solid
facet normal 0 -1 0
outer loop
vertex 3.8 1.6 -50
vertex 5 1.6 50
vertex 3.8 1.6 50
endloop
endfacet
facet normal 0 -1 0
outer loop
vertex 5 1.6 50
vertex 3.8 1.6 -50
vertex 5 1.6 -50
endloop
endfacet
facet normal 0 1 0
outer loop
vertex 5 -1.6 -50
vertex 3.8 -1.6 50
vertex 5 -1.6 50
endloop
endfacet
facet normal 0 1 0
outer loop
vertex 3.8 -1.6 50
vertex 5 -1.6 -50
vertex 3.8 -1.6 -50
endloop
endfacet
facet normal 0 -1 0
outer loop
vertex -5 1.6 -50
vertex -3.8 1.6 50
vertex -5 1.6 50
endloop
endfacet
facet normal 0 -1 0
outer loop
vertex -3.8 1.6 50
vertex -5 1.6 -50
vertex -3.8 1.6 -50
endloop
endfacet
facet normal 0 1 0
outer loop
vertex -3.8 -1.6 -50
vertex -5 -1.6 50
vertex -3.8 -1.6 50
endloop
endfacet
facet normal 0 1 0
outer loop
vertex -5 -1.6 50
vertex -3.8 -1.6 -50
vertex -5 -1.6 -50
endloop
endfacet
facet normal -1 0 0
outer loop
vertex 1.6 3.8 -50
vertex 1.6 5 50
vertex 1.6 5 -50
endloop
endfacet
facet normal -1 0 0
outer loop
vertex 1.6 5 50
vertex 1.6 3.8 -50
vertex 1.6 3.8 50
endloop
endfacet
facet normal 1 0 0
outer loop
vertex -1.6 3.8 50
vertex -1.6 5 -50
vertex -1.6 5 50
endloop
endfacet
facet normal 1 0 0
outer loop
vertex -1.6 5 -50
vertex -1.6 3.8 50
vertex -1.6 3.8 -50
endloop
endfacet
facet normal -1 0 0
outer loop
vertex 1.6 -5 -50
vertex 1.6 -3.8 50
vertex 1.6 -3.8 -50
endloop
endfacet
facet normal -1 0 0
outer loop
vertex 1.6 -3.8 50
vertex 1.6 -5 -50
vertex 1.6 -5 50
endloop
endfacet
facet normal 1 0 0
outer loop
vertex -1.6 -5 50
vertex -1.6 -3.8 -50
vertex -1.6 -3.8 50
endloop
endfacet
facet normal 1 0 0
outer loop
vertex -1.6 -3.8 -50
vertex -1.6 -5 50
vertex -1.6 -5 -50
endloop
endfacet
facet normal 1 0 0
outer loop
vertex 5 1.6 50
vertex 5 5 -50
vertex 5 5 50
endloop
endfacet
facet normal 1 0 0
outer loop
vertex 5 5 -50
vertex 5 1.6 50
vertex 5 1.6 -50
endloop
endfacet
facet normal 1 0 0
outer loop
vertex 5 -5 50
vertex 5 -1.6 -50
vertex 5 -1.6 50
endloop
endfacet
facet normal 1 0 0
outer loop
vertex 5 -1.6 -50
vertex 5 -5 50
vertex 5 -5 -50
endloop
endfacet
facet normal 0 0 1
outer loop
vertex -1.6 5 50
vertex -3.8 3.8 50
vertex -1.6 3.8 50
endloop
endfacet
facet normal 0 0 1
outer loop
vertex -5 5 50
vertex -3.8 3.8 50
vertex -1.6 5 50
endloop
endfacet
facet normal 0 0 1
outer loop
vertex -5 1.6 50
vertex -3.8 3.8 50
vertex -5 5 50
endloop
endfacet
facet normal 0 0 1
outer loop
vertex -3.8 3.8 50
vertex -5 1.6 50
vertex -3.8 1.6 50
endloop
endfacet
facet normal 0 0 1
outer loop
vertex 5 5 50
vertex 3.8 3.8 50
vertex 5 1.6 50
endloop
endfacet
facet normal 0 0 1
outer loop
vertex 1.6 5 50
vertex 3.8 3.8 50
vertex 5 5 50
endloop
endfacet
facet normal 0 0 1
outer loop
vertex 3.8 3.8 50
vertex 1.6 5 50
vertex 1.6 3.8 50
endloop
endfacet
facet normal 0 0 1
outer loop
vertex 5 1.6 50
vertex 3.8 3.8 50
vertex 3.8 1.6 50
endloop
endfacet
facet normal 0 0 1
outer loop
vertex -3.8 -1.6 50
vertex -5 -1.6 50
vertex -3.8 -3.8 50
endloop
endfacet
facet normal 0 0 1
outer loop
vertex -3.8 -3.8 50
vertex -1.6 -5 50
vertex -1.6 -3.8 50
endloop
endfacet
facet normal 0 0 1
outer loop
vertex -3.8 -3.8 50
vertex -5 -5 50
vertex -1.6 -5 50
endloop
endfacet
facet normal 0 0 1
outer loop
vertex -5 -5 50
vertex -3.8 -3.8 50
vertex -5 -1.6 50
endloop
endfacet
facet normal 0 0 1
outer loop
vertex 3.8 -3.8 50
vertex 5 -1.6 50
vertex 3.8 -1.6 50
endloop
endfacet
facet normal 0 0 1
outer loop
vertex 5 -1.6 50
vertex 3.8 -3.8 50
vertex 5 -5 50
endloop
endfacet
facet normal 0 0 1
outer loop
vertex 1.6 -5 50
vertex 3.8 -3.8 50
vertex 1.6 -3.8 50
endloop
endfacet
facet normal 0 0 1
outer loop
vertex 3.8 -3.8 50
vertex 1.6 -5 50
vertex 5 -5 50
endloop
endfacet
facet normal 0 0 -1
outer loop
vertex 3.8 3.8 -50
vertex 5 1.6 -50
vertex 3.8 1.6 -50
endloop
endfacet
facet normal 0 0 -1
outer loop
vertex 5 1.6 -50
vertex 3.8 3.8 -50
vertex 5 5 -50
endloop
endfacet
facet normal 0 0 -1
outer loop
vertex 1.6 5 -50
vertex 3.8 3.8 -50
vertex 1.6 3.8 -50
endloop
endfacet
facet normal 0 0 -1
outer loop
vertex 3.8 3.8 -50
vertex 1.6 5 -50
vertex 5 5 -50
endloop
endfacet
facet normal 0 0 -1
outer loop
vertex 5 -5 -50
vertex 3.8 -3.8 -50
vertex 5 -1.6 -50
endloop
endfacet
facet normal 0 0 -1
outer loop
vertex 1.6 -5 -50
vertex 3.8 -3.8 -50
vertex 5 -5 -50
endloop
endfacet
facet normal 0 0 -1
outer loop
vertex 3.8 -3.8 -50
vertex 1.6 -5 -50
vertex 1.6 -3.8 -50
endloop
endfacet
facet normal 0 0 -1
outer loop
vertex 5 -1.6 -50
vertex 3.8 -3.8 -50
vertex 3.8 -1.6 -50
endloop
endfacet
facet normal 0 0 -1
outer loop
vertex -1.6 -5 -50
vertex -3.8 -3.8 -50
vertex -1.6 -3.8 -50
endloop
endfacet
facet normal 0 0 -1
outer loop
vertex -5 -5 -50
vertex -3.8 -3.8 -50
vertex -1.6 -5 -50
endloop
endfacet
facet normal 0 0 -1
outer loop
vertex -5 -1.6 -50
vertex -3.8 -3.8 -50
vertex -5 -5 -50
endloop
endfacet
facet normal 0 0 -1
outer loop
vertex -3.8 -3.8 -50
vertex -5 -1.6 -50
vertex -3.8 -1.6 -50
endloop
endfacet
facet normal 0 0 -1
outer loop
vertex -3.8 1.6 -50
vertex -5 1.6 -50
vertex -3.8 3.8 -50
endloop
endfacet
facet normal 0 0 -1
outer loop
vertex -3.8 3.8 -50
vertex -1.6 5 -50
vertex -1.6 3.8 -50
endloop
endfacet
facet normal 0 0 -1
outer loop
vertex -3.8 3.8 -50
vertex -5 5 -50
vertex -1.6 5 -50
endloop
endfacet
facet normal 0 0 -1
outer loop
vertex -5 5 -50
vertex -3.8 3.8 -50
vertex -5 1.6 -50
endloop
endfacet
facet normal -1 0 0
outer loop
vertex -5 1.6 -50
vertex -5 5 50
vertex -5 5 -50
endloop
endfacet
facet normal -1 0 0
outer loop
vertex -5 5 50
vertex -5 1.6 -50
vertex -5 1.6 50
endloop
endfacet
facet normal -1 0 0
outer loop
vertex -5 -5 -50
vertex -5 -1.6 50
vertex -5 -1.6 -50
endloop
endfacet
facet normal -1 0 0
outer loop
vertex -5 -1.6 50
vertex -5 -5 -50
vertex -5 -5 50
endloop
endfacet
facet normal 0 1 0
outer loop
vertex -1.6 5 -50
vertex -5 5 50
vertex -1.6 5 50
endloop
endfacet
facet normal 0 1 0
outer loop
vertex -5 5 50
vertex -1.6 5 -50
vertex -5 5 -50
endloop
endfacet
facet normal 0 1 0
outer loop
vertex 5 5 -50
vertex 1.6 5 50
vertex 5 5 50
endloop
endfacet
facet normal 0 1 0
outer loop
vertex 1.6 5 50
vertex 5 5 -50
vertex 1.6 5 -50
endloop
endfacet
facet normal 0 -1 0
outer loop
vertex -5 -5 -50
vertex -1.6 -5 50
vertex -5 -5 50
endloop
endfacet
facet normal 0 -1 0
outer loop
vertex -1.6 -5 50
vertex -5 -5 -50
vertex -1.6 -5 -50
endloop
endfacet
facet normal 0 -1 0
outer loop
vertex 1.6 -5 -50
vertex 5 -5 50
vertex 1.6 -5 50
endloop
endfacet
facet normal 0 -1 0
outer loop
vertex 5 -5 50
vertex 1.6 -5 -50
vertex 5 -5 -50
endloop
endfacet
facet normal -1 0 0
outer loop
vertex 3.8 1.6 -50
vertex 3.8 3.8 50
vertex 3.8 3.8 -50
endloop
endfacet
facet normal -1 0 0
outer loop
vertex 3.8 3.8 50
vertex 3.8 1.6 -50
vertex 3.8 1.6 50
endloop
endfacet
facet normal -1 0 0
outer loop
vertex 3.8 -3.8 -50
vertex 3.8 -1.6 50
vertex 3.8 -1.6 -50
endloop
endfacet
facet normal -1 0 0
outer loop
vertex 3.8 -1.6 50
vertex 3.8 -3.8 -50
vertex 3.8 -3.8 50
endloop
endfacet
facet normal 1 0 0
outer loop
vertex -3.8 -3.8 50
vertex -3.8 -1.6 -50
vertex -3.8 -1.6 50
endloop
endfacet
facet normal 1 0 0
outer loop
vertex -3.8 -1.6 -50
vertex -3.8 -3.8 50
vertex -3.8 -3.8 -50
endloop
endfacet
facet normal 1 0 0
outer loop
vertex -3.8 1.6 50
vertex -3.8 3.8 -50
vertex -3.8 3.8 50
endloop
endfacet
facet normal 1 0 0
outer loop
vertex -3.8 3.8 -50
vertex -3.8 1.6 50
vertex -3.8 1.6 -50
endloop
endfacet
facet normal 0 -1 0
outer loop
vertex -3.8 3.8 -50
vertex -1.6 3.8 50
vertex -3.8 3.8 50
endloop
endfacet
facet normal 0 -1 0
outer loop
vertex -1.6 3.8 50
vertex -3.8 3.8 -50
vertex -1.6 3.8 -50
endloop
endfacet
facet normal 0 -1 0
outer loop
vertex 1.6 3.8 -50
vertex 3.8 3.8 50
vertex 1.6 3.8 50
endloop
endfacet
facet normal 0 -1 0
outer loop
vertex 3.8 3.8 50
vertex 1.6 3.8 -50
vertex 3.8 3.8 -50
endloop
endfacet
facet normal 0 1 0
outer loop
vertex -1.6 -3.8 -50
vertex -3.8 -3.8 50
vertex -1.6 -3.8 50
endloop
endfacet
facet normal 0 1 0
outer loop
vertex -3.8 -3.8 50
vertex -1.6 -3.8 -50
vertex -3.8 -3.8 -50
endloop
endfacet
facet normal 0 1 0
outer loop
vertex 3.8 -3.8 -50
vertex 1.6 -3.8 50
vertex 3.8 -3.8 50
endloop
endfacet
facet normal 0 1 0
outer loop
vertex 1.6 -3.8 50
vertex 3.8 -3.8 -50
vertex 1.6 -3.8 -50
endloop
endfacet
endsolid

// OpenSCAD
// 10x10 aluminium extrusion profile, 100mm long (single connected solid)

$fn = 64;

// Parameters
profile_width_mm  = 10.0;
profile_height_mm = 10.0;
length_mm         = 100.0;

wall_thickness_mm        = 1.2;
slot_opening_width_mm    = 3.2;
slot_neck_depth_mm       = 1.6;
slot_cavity_width_mm     = 6.2;
slot_cavity_depth_mm     = 2.6;
center_bore_diameter_mm  = 4.2;

cornerHole               = 1;
corner_hole_diameter_mm  = 2.2;
corner_hole_offset_mm    = 2.5;

overlap_mm = 0.2; // small overlap for robust booleans

// Helpers
function clamp(v, lo, hi) = v < lo ? lo : (v > hi ? hi : v);

module extrusion_10x10(len=length_mm) {
    w = profile_width_mm;
    h = profile_height_mm;

    // Keep geometry valid and visible
    t = clamp(wall_thickness_mm, 0.2, min(w, h)/2 - 0.6);

    slot_open_w = clamp(slot_opening_width_mm, 0.6, min(w, h) - 2*t - 0.6);
    neck_d      = clamp(slot_neck_depth_mm, 0.4, w/2 - t - 0.6);
    cav_w       = clamp(slot_cavity_width_mm, slot_open_w, min(w, h) - 2*t - 0.6);
    cav_d       = clamp(slot_cavity_depth_mm, 0.4, w/2 - t - neck_d - 0.6);

    bore_r = clamp(center_bore_diameter_mm/2, 0, min(w, h)/2 - t - 0.6);

    // Slot cut positions (from outer face inward)
    x_neck =  w/2 - neck_d/2;
    x_cav  =  w/2 - neck_d - cav_d/2;
    y_neck =  h/2 - neck_d/2;
    y_cav  =  h/2 - neck_d - cav_d/2;

    // Corner hole placement
    offx = w/2 - corner_hole_offset_mm;
    offy = h/2 - corner_hole_offset_mm;
    rch  = clamp(corner_hole_diameter_mm/2, 0, min(w, h)/2 - 0.6);

    // Build as a single connected solid: outer body minus internal features
    color("Silver")
    difference() {
        // Outer body (10x10 cross-section, length along Z)
        cube([w, h, len], center=true);

        // Inner void (tube) - ensure it doesn't erase everything
        cube([w - 2*t, h - 2*t, len + 2*overlap_mm], center=true);

        // T-slots (4 sides), cut through full length
        // Use explicit union to avoid any accidental separation in boolean evaluation
        union() {
            // +X side
            translate([ x_neck, 0, 0])
                cube([neck_d + 2*overlap_mm, slot_open_w, len + 2*overlap_mm], center=true);
            translate([ x_cav, 0, 0])
                cube([cav_d + 2*overlap_mm, cav_w, len + 2*overlap_mm], center=true);

            // -X side
            translate([-x_neck, 0, 0])
                cube([neck_d + 2*overlap_mm, slot_open_w, len + 2*overlap_mm], center=true);
            translate([-x_cav, 0, 0])
                cube([cav_d + 2*overlap_mm, cav_w, len + 2*overlap_mm], center=true);

            // +Y side
            translate([0,  y_neck, 0])
                cube([slot_open_w, neck_d + 2*overlap_mm, len + 2*overlap_mm], center=true);
            translate([0,  y_cav, 0])
                cube([cav_w, cav_d + 2*overlap_mm, len + 2*overlap_mm], center=true);

            // -Y side
            translate([0, -y_neck, 0])
                cube([slot_open_w, neck_d + 2*overlap_mm, len + 2*overlap_mm], center=true);
            translate([0, -y_cav, 0])
                cube([cav_w, cav_d + 2*overlap_mm, len + 2*overlap_mm], center=true);
        }

        // Center bore (through length)
        if (bore_r > 0)
            cylinder(r=bore_r, h=len + 2*overlap_mm, center=true);

        // Corner holes (optional)
        if (cornerHole && rch > 0) {
            union() {
                translate([ offx,  offy, 0]) cylinder(r=rch, h=len + 2*overlap_mm, center=true, $fn=48);
                translate([-offx,  offy, 0]) cylinder(r=rch, h=len + 2*overlap_mm, center=true, $fn=48);
                translate([-offx, -offy, 0]) cylinder(r=rch, h=len + 2*overlap_mm, center=true, $fn=48);
                translate([ offx, -offy, 0]) cylinder(r=rch, h=len + 2*overlap_mm, center=true, $fn=48);
            }
        }
    }
}

// Render
extrusion_10x10(length_mm);
